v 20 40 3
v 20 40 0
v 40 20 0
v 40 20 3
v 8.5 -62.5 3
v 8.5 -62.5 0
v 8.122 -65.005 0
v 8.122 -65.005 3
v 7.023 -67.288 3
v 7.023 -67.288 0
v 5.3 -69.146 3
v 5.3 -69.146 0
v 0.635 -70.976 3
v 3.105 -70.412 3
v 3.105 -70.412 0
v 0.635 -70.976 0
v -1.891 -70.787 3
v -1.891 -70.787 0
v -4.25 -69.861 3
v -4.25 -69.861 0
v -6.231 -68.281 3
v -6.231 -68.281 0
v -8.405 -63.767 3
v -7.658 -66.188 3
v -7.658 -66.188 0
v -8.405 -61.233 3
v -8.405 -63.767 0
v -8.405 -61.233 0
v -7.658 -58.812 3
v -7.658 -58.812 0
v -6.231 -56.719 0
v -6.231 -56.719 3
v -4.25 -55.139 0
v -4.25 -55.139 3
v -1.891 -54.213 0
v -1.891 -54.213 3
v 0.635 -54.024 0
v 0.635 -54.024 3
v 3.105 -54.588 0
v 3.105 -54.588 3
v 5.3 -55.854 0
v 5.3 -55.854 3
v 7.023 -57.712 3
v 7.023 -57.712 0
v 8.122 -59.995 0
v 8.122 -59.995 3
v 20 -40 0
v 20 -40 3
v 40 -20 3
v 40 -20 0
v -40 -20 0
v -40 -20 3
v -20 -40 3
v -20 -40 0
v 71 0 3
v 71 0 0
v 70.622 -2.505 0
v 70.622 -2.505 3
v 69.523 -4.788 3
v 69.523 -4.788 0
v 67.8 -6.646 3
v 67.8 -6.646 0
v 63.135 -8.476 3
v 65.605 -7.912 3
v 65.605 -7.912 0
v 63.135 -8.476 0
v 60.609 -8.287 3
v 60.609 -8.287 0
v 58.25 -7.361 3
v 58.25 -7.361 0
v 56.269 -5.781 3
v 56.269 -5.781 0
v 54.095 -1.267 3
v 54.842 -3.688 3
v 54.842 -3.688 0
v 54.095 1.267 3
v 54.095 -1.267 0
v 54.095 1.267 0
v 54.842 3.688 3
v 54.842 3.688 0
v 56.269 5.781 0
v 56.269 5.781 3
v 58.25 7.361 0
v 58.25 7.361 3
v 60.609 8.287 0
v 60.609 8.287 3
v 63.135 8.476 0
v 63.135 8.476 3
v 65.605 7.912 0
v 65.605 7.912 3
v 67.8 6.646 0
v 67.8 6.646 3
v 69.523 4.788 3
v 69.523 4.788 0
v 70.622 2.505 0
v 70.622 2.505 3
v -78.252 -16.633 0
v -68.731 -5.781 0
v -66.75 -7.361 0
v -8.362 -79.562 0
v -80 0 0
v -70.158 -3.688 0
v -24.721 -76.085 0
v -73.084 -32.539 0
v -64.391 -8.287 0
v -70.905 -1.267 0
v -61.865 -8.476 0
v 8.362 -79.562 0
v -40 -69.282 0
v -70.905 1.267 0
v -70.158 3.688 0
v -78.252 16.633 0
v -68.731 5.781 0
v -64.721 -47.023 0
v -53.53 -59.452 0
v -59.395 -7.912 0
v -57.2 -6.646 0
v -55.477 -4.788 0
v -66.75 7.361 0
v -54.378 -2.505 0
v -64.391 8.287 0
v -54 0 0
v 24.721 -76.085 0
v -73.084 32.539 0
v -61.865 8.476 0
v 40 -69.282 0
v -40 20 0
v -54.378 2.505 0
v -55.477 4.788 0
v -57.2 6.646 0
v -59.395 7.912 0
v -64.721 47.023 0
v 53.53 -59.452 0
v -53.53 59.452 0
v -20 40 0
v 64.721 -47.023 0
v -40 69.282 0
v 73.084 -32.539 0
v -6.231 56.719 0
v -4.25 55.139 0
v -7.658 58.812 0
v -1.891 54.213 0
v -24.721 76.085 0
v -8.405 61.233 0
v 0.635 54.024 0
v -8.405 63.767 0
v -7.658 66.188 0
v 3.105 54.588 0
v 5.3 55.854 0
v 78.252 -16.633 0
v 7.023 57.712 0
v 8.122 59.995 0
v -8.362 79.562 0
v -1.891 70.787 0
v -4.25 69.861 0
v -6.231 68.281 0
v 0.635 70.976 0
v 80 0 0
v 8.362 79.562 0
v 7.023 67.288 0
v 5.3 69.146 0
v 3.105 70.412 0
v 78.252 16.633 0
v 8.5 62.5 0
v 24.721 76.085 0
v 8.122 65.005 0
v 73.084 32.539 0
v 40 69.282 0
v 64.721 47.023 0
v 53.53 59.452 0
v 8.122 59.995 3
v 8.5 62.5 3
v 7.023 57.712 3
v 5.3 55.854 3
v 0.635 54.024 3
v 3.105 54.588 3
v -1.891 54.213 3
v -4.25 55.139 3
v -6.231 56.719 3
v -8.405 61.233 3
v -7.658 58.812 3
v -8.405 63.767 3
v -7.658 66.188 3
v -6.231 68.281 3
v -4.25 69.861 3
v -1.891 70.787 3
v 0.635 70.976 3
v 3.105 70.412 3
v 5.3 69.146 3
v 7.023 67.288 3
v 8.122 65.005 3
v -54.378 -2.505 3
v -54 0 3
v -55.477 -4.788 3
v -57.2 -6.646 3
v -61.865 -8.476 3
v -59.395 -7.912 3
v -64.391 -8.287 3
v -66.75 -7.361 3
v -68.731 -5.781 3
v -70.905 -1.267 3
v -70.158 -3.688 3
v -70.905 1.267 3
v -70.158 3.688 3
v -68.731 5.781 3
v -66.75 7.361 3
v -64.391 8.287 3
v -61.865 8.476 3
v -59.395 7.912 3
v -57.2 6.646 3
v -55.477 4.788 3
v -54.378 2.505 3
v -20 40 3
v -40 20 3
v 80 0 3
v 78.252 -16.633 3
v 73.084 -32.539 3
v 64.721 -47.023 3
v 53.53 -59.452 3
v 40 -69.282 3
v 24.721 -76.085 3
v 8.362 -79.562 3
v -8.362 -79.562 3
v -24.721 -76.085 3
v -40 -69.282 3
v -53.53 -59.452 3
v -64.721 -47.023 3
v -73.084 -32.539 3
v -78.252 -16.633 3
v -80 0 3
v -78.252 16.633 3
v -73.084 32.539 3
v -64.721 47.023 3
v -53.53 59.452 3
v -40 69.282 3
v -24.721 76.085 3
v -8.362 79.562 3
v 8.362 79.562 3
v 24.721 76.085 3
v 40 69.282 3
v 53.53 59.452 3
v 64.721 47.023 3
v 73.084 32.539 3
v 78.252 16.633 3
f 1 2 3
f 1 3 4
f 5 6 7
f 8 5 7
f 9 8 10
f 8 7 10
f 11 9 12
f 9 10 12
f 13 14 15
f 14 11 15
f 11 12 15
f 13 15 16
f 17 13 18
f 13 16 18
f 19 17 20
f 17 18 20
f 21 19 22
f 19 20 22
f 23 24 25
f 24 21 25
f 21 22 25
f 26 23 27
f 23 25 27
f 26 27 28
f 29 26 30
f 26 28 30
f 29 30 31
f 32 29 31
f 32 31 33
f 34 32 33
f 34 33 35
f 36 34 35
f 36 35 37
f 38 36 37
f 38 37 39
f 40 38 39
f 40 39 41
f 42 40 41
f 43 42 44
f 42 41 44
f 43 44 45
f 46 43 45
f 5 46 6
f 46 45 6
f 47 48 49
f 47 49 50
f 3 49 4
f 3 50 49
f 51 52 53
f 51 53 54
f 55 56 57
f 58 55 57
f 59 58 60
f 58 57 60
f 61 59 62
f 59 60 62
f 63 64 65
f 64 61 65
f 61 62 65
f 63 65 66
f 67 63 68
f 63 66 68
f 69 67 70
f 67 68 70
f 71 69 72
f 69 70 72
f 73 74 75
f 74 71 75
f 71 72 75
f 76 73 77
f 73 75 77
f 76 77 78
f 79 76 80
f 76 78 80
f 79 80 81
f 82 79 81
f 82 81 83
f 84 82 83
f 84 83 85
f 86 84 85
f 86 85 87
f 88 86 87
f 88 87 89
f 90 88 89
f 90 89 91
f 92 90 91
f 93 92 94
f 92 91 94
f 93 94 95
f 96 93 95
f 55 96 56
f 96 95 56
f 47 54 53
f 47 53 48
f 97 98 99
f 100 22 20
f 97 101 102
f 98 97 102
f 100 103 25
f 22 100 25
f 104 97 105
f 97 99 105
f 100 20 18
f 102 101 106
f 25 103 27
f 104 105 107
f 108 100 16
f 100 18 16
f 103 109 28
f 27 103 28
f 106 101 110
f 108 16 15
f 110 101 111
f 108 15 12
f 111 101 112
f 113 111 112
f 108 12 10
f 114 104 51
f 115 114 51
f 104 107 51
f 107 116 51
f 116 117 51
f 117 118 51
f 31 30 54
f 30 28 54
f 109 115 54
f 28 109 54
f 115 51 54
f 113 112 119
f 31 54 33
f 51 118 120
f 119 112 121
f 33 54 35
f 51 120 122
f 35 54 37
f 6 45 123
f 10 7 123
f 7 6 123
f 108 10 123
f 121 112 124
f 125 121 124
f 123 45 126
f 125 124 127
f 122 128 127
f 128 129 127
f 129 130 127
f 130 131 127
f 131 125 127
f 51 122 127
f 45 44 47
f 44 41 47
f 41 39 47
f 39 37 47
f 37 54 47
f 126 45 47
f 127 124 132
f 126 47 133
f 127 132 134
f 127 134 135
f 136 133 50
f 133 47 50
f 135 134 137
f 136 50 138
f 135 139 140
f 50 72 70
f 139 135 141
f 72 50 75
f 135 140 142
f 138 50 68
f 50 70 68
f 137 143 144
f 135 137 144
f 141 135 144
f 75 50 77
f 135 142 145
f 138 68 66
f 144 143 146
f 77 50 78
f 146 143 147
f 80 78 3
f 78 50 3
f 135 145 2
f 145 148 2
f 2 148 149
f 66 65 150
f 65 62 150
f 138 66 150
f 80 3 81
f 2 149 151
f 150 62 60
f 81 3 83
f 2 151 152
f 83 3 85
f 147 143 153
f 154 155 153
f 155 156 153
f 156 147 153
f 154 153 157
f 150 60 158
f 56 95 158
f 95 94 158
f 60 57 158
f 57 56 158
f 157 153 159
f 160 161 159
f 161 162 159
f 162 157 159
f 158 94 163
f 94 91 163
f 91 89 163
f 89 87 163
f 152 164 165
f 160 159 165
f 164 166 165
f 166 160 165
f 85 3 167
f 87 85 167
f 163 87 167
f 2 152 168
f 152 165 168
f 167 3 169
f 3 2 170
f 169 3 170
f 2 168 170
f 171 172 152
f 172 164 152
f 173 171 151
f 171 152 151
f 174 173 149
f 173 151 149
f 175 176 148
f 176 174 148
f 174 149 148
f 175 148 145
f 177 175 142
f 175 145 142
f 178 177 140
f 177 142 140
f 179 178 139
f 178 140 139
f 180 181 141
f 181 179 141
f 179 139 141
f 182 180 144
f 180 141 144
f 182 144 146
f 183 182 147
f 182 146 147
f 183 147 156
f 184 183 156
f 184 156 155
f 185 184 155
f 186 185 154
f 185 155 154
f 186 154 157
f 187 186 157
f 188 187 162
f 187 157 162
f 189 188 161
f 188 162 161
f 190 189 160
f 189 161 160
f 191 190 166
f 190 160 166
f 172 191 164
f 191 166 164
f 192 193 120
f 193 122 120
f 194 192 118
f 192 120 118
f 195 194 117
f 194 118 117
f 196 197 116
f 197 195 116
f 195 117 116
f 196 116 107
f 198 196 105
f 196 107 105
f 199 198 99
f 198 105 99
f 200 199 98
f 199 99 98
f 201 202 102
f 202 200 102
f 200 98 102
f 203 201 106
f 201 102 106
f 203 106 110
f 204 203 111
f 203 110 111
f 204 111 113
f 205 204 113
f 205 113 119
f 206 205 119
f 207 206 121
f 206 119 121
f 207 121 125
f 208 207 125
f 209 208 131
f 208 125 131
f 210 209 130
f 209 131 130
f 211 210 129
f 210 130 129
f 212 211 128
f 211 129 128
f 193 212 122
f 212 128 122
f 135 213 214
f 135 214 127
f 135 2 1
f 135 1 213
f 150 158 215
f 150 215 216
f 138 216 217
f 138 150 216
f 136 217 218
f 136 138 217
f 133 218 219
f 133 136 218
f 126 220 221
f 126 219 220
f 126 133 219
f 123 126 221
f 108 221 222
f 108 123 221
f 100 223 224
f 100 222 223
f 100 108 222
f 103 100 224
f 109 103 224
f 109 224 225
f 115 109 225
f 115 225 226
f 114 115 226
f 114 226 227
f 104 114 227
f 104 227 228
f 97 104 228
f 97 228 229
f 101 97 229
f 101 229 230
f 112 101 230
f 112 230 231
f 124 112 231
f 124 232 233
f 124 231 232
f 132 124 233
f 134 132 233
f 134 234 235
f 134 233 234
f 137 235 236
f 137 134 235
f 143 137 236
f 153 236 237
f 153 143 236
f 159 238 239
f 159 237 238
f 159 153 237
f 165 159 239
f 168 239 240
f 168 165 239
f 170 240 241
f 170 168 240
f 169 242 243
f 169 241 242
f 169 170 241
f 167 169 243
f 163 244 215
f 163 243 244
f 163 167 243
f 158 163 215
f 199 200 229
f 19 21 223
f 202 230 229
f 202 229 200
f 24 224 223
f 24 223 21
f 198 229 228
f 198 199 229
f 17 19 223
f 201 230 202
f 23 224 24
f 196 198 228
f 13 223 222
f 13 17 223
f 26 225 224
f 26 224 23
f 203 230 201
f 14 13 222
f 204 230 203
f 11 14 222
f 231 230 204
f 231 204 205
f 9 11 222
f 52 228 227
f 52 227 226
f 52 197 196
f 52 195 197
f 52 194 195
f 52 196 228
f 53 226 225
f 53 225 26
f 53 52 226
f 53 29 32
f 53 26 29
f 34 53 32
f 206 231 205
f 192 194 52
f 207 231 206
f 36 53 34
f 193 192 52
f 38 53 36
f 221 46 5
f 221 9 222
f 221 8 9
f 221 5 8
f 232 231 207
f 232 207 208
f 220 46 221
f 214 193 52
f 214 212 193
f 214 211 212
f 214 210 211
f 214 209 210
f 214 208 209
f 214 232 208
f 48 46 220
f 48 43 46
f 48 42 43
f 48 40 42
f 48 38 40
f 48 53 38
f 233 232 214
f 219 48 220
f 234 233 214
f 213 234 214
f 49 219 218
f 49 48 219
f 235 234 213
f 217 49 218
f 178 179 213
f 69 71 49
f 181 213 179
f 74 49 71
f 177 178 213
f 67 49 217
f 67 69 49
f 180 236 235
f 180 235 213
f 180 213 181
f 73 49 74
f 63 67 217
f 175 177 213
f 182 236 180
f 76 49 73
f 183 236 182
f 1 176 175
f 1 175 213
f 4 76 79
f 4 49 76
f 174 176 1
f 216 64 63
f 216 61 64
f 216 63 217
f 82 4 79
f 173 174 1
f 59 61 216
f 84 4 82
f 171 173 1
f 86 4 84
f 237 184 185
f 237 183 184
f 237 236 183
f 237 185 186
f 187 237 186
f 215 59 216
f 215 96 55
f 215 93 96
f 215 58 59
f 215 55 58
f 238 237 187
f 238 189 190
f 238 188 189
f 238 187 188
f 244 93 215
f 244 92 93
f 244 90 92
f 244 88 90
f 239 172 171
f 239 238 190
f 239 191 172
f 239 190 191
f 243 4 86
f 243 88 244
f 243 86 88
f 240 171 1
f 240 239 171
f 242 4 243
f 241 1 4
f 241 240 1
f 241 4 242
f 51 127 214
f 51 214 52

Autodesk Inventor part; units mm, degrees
ref_plane "YZ Plane" through (0, 0, 0) normal (1, 0, 0) x (0, 1, 0)
ref_plane "XZ Plane" through (0, 0, 0) normal (0, 1, 0) x (-1, 0, 0)
ref_plane "XY Plane" through (0, 0, 0) normal (0, 0, 1) x (1, 0, 0)
sketch "Sketch1" plane through (0, 0, 0) normal (0, 0, 1) x (1, 0, 0)
  circle A0 centre (0, 0) radius 80
  line L0 (40, 40) -> (-40, 40)
  line L1 (-40, 40) -> (-40, -40)
  line L2 (-40, -40) -> (40, -40)
  line L3 (40, -40) -> (40, 40)
  line L4 (40, 40) -> (-40, -40) construction
  line L5 (-40, 40) -> (40, -40) construction
  circle A1 centre (-62.5, 0) radius 8.5
  circle A2 centre (0, 0) radius 62.5 construction
  circle A3 centre (0, -62.5) radius 8.5
  circle A4 centre (62.5, 0) radius 8.5
  circle A5 centre (0, 62.5) radius 8.5
  dimension "d171" = 125
  dimension "d157" = 160
  dimension "d158" = 80
  dimension "d159" = 80
  dimension "d170" = 17
  dimension "d174" = 360
extrude "Plate5" add sketch "Sketch1" along normal blind 3
chamfer "Corner Chamfer2" distance 20 angle 45 4 edges at (-40, -40, 1.5) (40, -40, 1.5) (-40, 40, 1.5) (40, 40, 1.5)
properties part number "PRS 940-59 FDS MAIN FLANGE" material "Stainless Steel"
